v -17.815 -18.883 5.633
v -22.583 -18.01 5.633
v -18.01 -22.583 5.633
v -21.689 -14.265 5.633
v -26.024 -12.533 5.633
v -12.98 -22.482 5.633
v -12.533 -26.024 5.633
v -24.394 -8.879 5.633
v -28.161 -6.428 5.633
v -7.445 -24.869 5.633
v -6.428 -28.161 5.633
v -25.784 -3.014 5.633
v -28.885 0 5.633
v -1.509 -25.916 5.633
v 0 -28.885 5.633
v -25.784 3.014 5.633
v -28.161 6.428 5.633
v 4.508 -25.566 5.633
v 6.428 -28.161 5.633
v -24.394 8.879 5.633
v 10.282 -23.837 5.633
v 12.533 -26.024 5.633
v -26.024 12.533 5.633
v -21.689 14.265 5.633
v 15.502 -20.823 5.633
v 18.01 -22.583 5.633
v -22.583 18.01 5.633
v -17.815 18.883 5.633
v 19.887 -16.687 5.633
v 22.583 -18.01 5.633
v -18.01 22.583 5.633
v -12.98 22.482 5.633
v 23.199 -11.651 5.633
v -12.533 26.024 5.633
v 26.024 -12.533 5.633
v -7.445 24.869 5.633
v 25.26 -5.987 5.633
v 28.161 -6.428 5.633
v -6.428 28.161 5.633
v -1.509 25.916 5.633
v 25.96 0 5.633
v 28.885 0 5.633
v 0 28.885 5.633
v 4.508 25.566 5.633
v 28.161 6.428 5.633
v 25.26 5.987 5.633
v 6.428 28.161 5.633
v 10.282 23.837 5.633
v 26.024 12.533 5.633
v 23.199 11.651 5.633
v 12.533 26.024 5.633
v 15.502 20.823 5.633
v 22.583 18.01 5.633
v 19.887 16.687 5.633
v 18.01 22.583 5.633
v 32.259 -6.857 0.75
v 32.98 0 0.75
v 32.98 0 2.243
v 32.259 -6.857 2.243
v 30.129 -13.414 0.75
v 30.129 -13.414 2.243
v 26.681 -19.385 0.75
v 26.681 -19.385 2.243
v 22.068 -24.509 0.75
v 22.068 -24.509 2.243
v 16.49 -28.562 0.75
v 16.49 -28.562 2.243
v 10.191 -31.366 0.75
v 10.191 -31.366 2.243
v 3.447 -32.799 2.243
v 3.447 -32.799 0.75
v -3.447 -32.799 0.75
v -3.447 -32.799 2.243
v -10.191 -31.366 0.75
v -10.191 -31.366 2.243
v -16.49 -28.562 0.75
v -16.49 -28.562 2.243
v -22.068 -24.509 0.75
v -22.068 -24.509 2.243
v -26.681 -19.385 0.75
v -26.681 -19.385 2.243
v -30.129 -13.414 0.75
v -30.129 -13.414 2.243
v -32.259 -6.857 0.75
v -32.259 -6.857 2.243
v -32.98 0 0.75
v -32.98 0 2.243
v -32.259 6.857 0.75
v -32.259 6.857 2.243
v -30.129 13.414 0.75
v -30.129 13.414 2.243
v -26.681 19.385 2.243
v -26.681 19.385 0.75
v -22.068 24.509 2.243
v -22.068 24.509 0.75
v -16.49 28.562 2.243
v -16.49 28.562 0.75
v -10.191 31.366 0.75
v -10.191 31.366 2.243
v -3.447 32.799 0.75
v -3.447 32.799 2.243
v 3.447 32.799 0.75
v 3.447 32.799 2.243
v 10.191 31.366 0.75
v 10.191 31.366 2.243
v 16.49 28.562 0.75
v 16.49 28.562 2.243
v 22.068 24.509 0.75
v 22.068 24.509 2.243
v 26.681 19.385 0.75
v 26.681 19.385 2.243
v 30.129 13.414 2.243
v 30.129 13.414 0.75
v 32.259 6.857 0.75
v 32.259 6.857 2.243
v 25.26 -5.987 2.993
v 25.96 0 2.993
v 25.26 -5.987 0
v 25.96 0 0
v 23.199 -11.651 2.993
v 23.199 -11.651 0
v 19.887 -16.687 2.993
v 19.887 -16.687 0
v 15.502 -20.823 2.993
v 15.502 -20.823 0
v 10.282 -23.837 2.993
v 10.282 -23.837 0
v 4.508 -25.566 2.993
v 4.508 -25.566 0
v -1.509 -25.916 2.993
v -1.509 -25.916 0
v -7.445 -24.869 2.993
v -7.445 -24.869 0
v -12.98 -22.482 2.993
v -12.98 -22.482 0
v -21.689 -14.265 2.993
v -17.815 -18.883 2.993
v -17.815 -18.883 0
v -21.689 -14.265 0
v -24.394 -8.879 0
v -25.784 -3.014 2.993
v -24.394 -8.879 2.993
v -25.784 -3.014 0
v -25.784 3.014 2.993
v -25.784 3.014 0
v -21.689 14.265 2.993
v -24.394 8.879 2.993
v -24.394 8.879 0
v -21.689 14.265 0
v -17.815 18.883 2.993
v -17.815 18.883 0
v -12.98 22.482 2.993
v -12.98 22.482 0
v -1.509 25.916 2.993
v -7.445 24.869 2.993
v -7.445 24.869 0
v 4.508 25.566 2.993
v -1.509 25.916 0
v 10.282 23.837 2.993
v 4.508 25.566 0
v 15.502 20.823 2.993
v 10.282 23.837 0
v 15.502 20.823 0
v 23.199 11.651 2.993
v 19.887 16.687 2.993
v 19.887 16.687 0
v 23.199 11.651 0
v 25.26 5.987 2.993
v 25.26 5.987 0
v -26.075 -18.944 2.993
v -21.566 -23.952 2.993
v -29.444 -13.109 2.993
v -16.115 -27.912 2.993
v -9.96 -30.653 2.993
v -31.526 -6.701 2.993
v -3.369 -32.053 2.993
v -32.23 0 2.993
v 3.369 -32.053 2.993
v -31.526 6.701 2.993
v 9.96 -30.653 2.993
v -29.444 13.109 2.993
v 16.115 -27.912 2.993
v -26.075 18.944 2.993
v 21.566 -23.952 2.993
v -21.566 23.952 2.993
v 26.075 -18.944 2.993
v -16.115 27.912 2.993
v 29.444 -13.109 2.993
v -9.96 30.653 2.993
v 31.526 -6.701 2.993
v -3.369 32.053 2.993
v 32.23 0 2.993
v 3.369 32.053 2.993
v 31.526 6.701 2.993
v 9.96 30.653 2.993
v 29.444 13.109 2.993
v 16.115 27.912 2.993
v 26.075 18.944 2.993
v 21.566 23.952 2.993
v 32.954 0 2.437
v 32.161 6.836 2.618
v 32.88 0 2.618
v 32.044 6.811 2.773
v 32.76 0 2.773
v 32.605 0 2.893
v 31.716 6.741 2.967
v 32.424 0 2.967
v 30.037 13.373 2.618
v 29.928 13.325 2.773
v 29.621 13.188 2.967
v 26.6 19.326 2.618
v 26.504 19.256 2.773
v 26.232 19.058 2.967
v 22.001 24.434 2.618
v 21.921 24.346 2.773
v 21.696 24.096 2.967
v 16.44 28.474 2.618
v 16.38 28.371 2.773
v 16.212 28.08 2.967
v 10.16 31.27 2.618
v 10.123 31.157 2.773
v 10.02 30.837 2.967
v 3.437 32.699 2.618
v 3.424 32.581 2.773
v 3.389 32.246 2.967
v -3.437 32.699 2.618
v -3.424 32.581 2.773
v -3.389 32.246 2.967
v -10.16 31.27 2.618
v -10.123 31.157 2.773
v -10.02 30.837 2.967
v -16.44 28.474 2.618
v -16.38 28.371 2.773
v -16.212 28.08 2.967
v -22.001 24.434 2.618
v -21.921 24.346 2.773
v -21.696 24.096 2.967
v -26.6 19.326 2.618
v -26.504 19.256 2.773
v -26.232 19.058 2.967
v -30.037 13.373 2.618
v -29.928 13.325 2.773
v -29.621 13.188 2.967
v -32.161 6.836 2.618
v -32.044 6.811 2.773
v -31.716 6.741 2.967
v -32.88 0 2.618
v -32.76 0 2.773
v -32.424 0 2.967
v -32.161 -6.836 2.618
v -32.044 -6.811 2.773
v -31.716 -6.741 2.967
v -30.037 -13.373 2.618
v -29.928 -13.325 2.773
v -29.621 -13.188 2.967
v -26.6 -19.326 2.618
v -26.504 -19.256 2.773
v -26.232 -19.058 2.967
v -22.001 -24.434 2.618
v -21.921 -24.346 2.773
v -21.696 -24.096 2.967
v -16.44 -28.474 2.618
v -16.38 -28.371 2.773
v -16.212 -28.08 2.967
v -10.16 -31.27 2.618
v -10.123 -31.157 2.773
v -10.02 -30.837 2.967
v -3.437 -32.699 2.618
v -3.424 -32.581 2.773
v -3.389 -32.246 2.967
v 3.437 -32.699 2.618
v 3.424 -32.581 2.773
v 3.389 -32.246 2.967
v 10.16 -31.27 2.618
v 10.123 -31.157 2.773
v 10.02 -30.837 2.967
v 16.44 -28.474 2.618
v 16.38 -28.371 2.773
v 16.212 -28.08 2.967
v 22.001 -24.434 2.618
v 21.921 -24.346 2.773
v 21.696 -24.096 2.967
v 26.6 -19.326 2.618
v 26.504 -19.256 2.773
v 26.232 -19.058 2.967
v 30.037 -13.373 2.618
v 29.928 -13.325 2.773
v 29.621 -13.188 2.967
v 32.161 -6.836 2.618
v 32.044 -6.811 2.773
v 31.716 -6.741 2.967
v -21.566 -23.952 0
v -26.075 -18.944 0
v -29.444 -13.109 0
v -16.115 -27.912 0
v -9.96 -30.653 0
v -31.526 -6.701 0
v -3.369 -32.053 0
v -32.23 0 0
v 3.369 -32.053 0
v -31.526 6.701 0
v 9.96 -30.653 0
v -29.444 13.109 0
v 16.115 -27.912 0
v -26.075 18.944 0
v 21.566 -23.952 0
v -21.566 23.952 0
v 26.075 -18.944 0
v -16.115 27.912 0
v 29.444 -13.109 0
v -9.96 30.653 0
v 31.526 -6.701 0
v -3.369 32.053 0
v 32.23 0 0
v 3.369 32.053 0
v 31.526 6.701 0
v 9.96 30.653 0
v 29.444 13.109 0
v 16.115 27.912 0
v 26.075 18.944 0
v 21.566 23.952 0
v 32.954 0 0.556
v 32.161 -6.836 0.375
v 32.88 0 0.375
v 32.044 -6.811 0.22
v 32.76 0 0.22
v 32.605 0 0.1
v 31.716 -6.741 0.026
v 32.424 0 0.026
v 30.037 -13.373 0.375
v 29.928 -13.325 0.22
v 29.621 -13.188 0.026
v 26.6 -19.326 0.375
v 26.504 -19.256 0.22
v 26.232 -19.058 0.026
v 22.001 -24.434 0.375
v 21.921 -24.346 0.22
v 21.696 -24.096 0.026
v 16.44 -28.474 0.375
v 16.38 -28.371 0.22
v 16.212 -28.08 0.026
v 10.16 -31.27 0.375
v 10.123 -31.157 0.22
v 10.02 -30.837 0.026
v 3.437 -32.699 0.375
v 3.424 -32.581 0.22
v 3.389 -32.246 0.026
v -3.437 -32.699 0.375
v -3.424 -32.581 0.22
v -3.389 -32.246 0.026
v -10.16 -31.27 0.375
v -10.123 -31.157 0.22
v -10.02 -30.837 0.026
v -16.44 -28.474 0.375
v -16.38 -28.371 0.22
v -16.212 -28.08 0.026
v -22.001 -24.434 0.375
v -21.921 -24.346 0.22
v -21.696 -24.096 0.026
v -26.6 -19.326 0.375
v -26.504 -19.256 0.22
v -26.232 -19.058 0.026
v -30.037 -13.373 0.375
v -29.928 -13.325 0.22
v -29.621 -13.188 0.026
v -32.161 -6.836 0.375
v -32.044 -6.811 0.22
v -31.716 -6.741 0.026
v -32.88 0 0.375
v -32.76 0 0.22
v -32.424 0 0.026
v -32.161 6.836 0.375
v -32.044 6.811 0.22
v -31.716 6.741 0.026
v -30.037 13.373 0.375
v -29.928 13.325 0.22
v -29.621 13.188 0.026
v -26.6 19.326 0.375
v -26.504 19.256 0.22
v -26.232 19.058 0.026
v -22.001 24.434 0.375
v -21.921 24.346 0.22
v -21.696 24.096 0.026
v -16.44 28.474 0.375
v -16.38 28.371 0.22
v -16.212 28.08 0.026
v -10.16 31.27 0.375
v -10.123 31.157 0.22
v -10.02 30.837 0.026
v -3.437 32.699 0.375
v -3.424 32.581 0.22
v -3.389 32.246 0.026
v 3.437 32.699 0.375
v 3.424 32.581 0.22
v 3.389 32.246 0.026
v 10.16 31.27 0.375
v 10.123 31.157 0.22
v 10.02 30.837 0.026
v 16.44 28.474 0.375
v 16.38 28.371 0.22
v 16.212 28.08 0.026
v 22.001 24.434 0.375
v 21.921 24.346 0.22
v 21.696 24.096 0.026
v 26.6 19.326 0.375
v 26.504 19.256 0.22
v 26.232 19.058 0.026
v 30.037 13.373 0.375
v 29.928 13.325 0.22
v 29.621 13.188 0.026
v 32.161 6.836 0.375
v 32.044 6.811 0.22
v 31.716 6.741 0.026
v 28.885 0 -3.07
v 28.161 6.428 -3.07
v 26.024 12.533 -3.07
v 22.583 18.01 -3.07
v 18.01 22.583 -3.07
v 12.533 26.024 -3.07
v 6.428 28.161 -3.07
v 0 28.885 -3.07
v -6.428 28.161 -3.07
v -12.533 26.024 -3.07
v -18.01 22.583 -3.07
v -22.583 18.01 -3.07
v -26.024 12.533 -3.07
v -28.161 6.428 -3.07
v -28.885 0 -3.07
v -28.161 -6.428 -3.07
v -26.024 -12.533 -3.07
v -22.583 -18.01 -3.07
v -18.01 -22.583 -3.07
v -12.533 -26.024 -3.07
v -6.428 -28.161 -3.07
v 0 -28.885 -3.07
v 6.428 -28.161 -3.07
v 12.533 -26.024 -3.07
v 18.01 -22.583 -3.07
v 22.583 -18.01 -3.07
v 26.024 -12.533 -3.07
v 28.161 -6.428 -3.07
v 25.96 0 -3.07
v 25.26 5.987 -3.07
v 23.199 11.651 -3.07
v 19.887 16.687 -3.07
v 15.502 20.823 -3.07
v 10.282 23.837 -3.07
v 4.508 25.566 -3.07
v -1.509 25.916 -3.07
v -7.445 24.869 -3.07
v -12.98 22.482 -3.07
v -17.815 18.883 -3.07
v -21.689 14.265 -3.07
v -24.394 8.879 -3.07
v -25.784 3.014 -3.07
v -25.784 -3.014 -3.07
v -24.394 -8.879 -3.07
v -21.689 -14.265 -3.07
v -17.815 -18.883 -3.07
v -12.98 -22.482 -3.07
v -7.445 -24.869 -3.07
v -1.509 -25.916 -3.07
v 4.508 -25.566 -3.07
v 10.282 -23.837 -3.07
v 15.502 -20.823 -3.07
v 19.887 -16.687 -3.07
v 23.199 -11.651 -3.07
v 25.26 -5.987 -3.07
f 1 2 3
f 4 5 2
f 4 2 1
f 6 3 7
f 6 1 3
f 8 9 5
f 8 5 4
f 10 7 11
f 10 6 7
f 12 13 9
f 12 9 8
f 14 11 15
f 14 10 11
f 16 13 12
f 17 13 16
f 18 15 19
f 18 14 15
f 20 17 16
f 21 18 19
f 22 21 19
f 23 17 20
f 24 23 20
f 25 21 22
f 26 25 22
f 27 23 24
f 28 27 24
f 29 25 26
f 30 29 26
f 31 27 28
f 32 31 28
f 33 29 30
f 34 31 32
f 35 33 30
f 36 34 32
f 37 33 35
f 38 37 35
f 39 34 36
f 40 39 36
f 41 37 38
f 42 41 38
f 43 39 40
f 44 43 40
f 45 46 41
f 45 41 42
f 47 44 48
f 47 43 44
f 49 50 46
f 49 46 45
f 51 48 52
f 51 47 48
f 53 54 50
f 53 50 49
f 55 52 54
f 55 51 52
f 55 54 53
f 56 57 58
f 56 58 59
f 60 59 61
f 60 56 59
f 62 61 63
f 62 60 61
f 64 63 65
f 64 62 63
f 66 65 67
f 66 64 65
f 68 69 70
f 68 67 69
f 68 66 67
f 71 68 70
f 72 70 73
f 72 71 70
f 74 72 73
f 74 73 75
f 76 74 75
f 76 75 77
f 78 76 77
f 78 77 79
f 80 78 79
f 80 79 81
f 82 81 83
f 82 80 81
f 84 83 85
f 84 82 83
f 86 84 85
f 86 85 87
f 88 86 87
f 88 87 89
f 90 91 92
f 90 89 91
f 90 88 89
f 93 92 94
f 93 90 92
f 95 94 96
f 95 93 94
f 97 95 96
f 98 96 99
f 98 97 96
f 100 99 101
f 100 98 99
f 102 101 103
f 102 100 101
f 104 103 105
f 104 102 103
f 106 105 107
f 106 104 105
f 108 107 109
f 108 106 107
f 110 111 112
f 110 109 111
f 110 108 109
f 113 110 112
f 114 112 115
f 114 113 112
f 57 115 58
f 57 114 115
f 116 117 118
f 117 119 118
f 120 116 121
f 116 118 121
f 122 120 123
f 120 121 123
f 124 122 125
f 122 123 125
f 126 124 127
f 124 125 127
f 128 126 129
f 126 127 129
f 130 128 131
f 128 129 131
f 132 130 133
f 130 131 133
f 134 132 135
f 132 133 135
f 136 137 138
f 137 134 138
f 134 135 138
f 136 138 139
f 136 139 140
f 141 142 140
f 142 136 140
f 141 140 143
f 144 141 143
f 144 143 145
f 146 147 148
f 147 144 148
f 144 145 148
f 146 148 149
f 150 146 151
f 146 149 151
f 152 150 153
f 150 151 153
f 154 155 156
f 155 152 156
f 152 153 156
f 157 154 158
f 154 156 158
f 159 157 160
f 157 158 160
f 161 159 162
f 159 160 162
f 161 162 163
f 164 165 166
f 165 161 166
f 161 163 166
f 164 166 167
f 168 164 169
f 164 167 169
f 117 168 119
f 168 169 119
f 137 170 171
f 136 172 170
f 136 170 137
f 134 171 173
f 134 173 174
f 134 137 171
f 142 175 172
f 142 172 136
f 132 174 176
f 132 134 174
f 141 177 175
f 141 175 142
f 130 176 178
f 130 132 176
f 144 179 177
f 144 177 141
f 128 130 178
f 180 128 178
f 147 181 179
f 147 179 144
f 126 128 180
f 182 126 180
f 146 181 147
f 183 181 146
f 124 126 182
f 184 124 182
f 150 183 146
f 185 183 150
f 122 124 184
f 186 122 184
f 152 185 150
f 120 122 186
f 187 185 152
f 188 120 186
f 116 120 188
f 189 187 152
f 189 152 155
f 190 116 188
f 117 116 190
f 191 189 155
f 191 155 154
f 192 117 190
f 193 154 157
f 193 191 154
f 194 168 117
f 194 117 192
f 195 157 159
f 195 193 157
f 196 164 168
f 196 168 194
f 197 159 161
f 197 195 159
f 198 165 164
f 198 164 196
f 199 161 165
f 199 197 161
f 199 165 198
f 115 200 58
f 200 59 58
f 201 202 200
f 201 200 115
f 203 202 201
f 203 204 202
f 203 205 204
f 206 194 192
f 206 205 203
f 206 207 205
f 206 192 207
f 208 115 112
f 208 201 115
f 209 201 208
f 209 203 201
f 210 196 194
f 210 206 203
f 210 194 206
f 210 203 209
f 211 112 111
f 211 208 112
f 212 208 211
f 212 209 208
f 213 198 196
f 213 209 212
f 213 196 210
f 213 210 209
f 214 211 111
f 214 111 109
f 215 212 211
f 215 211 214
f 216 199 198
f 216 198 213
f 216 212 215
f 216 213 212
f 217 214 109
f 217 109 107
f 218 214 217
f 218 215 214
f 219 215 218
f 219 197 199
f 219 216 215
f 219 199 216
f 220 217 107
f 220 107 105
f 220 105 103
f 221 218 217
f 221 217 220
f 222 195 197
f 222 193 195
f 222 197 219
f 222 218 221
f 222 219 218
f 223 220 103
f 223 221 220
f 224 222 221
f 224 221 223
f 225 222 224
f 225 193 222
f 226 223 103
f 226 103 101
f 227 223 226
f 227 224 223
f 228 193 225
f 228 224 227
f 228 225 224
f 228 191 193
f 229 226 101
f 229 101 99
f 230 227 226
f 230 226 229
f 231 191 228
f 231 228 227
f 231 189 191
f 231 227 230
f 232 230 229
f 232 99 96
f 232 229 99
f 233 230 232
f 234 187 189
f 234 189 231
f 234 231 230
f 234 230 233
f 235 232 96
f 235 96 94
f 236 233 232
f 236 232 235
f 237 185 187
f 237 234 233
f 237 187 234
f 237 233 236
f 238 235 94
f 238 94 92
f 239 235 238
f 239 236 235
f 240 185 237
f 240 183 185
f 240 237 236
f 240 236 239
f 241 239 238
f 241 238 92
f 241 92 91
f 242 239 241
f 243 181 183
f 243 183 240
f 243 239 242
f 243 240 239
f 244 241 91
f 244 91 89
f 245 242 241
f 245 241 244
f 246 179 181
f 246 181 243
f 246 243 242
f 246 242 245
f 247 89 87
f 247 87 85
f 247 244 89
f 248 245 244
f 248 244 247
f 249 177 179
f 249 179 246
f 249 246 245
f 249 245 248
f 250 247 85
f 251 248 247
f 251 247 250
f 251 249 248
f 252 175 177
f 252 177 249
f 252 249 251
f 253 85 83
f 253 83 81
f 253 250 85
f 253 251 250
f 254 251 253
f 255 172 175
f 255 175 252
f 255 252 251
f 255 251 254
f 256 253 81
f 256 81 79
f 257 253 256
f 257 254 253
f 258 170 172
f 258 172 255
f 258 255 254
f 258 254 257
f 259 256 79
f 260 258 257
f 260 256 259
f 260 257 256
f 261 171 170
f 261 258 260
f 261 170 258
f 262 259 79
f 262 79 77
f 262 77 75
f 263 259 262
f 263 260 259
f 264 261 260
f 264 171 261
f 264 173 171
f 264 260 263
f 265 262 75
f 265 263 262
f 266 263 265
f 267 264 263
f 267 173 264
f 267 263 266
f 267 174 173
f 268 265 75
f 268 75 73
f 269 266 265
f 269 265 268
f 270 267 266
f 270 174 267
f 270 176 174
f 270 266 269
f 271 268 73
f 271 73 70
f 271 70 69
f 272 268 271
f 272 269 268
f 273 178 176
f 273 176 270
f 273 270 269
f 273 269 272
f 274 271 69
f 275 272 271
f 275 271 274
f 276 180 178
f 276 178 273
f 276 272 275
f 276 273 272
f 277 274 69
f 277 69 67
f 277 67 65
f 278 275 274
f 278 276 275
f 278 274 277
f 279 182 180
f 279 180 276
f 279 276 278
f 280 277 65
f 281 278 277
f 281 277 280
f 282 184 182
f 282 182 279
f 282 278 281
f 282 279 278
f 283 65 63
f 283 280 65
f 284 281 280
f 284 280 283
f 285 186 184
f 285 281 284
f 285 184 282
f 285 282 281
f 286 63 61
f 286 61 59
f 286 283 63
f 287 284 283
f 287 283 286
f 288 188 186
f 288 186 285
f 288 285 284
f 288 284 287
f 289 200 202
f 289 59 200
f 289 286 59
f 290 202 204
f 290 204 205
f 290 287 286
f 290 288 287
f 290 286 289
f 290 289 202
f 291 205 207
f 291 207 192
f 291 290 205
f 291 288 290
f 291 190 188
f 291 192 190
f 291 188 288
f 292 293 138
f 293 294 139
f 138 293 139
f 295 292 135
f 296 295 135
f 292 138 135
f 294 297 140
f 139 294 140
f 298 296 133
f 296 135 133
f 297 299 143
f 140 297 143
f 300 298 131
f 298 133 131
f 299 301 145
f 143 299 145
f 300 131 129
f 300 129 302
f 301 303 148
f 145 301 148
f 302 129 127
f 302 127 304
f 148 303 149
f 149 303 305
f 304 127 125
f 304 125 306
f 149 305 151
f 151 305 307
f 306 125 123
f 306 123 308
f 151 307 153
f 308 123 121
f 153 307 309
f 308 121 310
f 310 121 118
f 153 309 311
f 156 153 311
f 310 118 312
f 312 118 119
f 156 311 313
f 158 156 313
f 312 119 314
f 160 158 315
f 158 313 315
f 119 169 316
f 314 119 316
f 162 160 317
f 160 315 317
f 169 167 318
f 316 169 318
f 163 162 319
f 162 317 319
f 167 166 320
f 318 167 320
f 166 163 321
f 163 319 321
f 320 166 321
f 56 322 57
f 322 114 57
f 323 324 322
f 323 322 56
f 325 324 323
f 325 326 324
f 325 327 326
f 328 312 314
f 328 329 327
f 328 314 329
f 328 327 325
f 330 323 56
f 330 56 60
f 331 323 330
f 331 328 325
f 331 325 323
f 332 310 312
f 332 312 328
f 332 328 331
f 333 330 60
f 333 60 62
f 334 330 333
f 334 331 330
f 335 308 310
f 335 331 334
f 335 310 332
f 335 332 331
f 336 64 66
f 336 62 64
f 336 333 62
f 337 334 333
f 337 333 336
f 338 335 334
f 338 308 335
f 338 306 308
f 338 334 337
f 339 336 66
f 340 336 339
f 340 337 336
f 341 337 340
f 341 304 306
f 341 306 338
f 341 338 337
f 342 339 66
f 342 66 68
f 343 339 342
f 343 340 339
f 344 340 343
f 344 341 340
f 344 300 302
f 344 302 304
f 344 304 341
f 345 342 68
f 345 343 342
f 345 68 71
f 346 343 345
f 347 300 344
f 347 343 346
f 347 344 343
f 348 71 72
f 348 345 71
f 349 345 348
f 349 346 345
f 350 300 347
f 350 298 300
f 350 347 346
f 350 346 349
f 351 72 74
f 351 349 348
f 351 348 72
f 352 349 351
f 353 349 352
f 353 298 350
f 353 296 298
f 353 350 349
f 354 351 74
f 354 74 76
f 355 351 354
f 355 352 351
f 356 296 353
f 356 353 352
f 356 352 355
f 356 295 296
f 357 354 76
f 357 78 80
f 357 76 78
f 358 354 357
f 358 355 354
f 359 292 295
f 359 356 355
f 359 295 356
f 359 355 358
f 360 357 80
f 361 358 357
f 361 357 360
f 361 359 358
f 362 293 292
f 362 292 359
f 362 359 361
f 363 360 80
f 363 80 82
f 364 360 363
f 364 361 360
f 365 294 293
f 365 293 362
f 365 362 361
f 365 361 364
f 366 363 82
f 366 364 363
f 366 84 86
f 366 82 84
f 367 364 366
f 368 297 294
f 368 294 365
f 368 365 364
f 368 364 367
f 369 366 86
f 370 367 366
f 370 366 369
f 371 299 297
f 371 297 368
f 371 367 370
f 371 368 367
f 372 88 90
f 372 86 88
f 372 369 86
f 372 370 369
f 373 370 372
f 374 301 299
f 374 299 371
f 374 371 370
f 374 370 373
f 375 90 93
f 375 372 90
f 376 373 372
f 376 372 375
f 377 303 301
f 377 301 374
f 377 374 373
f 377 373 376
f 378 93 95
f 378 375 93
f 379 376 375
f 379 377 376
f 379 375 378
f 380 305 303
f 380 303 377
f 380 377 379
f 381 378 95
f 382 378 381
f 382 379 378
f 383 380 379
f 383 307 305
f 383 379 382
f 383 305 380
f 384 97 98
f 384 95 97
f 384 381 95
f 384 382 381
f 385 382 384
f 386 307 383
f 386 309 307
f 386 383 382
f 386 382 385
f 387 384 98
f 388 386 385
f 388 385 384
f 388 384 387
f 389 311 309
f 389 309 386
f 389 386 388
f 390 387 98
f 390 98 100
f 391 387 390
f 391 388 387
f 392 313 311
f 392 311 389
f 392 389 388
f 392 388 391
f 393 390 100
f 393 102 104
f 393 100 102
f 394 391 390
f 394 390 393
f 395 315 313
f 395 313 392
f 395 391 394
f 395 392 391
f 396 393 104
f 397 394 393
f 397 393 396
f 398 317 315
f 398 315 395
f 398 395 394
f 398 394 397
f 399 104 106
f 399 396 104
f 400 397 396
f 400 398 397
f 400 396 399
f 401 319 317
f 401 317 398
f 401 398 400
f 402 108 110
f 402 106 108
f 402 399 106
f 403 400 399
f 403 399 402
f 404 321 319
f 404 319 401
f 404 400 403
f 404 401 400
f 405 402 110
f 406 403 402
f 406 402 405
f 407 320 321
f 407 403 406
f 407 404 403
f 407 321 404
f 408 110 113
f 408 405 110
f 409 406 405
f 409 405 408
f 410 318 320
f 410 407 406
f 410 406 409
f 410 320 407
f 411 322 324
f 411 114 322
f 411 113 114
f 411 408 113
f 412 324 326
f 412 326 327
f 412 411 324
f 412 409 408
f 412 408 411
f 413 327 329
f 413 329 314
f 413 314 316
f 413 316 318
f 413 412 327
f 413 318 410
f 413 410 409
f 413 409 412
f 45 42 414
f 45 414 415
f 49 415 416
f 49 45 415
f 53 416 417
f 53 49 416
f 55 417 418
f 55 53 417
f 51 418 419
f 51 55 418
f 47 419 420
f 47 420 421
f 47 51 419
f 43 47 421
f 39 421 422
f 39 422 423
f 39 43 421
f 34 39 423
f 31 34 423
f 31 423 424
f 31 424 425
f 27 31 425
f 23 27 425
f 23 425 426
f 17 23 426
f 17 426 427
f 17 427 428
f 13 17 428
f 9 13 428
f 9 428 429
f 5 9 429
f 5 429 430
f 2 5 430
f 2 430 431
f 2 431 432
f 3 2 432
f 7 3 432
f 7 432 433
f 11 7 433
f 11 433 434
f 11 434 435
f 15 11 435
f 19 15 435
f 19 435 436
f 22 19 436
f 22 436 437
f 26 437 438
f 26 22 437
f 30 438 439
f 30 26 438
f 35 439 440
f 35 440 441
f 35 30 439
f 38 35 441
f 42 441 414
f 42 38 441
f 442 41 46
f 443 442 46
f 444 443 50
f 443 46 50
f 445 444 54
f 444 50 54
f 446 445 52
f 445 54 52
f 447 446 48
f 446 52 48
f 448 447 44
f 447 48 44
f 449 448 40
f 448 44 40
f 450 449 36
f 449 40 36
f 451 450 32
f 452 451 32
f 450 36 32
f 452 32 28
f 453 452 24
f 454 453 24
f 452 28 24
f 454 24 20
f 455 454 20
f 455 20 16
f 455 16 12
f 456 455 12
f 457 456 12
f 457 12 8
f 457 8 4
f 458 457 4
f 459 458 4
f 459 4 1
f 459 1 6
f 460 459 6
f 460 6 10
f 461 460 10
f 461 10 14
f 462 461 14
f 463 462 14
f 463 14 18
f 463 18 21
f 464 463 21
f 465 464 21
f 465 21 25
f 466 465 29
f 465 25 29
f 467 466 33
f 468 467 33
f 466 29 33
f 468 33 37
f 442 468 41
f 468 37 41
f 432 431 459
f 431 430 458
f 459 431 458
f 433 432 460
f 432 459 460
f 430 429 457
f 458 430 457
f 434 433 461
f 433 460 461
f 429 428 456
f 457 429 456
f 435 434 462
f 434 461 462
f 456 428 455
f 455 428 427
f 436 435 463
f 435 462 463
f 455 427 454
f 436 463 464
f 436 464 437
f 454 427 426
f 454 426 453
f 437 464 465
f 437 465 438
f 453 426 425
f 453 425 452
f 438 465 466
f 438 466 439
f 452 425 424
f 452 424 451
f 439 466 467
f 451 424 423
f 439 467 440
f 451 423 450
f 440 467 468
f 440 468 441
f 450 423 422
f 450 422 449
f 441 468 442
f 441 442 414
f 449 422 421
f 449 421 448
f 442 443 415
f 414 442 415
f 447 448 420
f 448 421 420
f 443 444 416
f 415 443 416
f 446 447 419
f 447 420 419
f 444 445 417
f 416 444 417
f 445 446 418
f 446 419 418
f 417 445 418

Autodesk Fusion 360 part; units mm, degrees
sketch "inner and outer rings of pulley" plane through (0, 0, 0) normal (0, 0, 1) x (1, 0, 0)
  circle A0 centre (0, 0) radius 25.96
  circle A1 centre (0, 0) radius 32.98
  circle A2 centre (0, 0) radius 28.885
  dimension "d1" = 51.92
  dimension "d5" = 65.96
  dimension "d12" = 57.77
extrude "Extrude1" add sketch "inner and outer rings of pulley" along normal blind 2.993 contours A1 | A2 makes body 1
extrude "Extrude2" add sketch "inner and outer rings of pulley" along normal blind -3.07 and the other way blind -5.633 separate body contours A2 makes body 2
fillet "Fillet4" radius 0.75 2 edges at (-30.7482, -11.9261, 2.993) (-30.7482, -11.9261, 0) on bodies 1
fillet "Fillet1" [suppressed]
fillet "Fillet2" [suppressed]
